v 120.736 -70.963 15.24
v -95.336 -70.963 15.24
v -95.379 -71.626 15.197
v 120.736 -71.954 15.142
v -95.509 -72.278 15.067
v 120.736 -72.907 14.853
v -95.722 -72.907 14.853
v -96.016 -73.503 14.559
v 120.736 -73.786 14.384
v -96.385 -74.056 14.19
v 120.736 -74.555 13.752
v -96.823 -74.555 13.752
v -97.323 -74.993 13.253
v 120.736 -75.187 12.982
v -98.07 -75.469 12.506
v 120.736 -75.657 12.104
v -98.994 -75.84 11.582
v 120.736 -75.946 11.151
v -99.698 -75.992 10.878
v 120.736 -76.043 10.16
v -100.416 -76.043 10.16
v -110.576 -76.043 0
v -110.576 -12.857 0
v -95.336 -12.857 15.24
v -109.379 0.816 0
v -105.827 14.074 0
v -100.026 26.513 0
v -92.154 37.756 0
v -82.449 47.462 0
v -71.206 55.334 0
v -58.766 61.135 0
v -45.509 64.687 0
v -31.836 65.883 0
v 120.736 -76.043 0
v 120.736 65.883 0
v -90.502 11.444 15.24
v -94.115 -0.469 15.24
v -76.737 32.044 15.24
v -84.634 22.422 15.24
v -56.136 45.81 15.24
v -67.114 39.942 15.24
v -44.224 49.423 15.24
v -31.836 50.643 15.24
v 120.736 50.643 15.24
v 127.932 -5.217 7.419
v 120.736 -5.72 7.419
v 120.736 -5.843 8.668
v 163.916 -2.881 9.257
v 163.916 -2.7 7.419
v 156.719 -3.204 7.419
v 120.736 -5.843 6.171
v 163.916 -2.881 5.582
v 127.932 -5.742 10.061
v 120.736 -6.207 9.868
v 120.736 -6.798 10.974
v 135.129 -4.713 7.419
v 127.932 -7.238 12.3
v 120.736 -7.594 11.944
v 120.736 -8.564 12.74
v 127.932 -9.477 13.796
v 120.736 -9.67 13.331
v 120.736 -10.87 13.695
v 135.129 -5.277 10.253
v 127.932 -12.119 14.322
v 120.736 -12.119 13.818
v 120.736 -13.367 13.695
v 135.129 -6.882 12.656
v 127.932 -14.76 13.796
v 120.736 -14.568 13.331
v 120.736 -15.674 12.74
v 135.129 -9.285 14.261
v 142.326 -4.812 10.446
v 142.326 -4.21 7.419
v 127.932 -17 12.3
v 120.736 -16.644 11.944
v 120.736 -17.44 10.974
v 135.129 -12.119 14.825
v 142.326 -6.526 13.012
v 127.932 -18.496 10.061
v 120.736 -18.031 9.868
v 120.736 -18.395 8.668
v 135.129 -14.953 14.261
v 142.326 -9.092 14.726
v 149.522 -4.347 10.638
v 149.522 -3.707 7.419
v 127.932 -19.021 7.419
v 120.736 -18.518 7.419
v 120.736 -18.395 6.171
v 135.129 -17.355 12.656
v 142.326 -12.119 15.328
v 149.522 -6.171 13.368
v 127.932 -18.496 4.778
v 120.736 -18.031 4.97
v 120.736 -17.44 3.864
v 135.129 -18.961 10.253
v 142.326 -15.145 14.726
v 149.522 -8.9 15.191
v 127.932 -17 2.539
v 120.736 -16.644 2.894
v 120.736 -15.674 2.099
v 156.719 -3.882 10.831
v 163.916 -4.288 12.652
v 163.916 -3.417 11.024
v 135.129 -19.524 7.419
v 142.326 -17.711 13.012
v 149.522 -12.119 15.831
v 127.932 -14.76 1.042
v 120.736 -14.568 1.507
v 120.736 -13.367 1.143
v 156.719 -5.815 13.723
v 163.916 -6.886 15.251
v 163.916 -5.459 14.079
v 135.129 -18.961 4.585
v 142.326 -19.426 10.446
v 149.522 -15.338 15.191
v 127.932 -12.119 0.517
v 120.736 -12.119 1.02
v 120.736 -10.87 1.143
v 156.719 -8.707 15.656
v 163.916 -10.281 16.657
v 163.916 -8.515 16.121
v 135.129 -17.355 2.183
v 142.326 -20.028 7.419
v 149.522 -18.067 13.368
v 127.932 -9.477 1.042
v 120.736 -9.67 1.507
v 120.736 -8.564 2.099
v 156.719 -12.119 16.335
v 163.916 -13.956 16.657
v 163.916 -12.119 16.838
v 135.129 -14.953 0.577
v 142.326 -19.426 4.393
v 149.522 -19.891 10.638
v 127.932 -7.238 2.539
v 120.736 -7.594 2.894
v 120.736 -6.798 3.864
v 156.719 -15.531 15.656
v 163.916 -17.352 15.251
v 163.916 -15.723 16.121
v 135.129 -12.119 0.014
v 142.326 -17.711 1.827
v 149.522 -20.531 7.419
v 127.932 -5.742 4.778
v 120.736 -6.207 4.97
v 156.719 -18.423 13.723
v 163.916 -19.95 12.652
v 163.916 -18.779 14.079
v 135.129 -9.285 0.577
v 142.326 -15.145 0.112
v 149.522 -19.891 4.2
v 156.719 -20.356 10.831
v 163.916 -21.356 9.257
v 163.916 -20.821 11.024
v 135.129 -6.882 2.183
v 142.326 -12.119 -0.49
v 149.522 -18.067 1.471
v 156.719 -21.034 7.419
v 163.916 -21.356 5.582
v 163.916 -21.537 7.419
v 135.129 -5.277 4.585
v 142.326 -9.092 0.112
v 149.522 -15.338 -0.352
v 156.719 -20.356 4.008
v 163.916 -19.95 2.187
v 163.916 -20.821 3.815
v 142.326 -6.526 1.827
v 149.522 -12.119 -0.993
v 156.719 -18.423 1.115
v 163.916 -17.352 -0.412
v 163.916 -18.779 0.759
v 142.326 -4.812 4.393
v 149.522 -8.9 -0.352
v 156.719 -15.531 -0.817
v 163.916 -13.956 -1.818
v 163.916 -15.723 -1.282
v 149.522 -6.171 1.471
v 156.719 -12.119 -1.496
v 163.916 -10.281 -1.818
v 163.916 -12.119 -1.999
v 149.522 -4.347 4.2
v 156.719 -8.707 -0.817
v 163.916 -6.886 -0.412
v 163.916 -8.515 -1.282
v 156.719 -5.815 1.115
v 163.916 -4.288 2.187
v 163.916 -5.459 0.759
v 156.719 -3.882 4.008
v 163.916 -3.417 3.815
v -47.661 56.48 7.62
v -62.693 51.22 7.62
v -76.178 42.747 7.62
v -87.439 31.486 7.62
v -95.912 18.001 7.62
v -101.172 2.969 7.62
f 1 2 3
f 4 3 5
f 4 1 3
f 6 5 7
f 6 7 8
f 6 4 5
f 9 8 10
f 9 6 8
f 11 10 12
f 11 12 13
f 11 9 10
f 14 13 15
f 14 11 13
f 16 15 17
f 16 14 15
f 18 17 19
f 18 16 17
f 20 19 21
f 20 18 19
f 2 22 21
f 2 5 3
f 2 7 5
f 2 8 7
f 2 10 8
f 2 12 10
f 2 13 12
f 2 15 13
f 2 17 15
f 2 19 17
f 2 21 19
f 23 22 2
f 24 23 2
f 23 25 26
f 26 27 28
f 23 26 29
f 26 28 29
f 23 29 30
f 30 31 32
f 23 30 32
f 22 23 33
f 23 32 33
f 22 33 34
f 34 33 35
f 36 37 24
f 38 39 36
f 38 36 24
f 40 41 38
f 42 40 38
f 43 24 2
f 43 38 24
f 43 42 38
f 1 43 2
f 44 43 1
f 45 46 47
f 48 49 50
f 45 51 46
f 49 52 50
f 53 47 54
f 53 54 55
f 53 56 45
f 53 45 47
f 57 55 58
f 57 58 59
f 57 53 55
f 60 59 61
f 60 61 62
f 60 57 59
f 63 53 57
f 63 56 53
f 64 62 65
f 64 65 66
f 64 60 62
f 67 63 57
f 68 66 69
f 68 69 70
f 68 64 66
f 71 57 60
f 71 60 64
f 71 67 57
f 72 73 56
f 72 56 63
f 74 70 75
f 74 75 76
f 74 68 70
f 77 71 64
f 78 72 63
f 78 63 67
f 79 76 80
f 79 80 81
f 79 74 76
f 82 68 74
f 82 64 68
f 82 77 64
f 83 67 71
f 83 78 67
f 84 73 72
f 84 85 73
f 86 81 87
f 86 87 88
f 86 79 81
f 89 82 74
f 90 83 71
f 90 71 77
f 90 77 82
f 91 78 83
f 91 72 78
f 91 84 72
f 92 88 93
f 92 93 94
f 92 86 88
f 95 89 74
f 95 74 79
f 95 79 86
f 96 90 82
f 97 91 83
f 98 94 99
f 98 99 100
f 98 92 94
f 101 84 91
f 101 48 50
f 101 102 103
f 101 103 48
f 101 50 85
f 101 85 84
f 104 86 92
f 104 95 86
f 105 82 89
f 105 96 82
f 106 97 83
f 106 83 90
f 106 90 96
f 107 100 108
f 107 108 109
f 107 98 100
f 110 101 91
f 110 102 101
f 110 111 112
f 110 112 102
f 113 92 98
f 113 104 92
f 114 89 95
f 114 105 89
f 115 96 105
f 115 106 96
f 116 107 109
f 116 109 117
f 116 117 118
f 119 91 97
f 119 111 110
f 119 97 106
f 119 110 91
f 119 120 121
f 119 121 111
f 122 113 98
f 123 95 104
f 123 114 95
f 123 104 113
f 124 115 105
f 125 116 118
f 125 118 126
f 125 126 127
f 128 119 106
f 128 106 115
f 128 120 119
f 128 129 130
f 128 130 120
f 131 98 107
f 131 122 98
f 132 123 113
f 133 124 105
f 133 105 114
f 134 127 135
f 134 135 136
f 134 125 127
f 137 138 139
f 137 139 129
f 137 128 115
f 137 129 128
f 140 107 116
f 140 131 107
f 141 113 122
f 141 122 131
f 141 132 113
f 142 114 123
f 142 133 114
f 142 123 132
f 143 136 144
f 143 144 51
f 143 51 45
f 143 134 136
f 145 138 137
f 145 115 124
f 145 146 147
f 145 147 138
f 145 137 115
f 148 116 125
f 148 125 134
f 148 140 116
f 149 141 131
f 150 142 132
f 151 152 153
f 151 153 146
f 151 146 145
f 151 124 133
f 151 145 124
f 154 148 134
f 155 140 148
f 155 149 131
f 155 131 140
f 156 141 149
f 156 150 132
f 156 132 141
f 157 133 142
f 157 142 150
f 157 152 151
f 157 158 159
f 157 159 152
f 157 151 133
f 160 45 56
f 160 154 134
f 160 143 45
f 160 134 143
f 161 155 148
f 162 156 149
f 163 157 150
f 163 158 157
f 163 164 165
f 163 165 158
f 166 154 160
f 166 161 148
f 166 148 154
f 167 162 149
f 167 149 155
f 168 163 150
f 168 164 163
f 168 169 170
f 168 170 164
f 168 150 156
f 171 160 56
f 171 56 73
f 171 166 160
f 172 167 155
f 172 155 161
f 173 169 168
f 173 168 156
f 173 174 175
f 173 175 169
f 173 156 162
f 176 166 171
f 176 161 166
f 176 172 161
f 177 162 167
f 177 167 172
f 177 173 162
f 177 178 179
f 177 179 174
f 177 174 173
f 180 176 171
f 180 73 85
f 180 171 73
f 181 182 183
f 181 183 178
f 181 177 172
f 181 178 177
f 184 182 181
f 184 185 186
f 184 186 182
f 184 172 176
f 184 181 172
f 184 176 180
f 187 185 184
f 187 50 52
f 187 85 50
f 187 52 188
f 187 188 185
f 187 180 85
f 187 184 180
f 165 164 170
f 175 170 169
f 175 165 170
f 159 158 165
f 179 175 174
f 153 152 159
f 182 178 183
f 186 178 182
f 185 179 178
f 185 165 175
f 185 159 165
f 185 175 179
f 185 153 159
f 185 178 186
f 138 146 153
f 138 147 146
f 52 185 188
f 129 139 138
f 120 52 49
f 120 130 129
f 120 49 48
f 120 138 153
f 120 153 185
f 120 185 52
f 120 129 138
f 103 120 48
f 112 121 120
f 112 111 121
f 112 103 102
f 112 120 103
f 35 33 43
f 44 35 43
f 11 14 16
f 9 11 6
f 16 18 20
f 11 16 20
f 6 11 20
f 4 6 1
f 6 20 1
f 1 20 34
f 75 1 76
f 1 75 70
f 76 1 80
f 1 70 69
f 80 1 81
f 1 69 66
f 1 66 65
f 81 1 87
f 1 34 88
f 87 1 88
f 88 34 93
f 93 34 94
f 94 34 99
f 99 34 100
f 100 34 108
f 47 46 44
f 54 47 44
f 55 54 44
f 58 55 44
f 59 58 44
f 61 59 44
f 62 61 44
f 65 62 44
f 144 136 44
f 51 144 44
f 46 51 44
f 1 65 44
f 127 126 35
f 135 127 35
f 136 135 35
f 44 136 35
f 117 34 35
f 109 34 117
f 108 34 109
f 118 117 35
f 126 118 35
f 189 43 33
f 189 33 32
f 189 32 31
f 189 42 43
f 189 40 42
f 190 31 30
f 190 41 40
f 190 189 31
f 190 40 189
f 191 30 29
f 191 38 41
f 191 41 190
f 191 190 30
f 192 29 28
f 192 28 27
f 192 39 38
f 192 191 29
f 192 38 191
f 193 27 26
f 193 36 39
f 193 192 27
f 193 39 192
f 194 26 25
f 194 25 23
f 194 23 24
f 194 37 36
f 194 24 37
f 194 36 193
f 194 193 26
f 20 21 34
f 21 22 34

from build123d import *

# Parameters (mm, degrees)
F1_DEPTH    = 15.24
F2_T1_DEPTH = 217.8918149653
F2_T3_DEPTH = 128.5071697417
F2_T6_ANGLE = 90
F3_R        = 5.08
F4_R        = 6.3991299939
F5_DEPTH    = 43.18
F5_TAPER    = -4


# Not quite as in the source:
# - a fillet or chamfer that OpenCascade refuses, or shapes differently, is made with other operations: its cross-section is extruded or revolved along the edge and cut away or added


with BuildPart() as f1:
    # F0 (on Top) → F1 (new body)
    with BuildSketch(Plane.XY):
        with BuildLine():
            Line((120.7355335355, 76.0432109237), (-31.8355335355, 76.0432109237))
            ThreePointArc((-31.8355335355, 76.0432109237), (-94.697326383, 50.0050037712), (-120.7355335355, -12.8567890763))
            Line((-120.7355335355, -12.8567890763), (-120.7355335355, -76.0432109237))
            Line((-120.7355335355, -76.0432109237), (120.7355335355, -76.0432109237))
            Line((120.7355335355, -76.0432109237), (120.7355335355, 76.0432109237))
        make_face()
    extrude(amount=F1_DEPTH)

    # F2: chamfer of 25.4 on 1 edges, made by hand

    # F2_s2 → F2_t1 (cut)
    with BuildSketch(Plane.YZ.offset(-31.8355335355)):
        Polygon((76.0432109237, -10.16), (50.6432109237, 15.24), (76.0432109237, 15.24), align=None)
    extrude(amount=F2_T1_DEPTH, mode=Mode.SUBTRACT)

    # F2_s4 → F2_t3 (cut)
    with BuildSketch(Plane.XZ.offset(12.8567890763)):
        Polygon((-120.7355335355, -10.16), (-95.3355335355, 15.24), (-120.7355335355, 15.24), align=None)
    extrude(amount=F2_T3_DEPTH, mode=Mode.SUBTRACT)

    # F2_s5 → F2_t6 (revolve, cut)
    with BuildSketch(Plane.YZ.offset(-31.8355335355)):
        Polygon((76.0432109237, -10.16), (50.6432109237, 15.24), (76.0432109237, 15.24), align=None)
    revolve(axis=Axis((-31.8355335355, -12.8567890763, 15.24), (0, 0, 1)), revolution_arc=F2_T6_ANGLE, mode=Mode.SUBTRACT)

    # F3
    f3_edges = [f1.edges().sort_by_distance(p)[0] for p in [
        (12.7, -76.043211, 15.24),
    ]]
    fillet(f3_edges, radius=F3_R)

    # F4 (on face) → F5 (join)
    with BuildSketch(Plane.YZ.offset(120.7355335355)):
        with Locations((-12.1188843623, 7.419291418)):
            Circle(F4_R)
    extrude(amount=F5_DEPTH, taper=F5_TAPER)


solid = f1.part
